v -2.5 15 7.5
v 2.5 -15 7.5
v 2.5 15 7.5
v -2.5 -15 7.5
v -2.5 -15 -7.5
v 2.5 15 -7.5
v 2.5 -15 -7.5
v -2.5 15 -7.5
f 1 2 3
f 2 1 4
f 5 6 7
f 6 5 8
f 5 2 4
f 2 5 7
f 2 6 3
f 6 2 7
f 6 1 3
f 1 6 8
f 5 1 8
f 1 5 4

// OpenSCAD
// Generated by generate_scads.py
cube(size=[5,30,15], center=true);
